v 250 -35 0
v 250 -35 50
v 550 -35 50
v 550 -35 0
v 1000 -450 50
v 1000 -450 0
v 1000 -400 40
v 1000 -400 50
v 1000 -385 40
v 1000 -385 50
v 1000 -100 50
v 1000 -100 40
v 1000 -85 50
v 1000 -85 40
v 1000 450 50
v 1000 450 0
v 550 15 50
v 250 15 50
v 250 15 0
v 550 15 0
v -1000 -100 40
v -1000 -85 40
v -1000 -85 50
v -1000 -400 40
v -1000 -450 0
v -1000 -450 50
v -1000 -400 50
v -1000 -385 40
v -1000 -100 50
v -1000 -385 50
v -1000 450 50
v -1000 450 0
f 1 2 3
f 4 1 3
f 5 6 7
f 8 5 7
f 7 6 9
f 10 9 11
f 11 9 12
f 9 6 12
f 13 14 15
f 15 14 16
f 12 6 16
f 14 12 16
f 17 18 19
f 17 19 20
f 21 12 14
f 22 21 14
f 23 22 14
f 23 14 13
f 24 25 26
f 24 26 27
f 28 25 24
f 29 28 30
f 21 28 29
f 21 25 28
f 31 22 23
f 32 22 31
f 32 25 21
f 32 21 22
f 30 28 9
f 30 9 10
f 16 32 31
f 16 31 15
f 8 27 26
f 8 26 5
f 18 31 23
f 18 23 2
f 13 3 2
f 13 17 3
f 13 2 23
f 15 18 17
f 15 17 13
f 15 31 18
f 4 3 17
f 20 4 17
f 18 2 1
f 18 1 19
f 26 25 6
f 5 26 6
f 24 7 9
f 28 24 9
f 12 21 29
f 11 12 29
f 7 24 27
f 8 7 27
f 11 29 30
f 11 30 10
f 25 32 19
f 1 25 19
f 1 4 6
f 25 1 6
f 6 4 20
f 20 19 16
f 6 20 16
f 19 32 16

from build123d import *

# Parameters (mm, degrees)
F0_W     = 2000
F0_H     = 900
F1_DEPTH = 50
F3_W     = 15
F3_H     = 10
F4_DEPTH = 2000
F5_W     = 15
F5_H     = 10
F6_DEPTH = 2000
F7_W     = 300
F7_H     = 50
F8_DEPTH = 50


with BuildPart() as f1:
    # F0 (on Top) → F1 (new body)
    with BuildSketch(Plane.XY):
        Rectangle(F0_W, F0_H)
    extrude(amount=F1_DEPTH)

    # F3 (on face) → F4 (cut)
    with BuildSketch(Plane.YZ.offset(1000)):
        with Locations((-92.5, 45)):
            Rectangle(F3_W, F3_H)
    extrude(amount=-F4_DEPTH, mode=Mode.SUBTRACT)

    # F5 (on face) → F6 (cut)
    with BuildSketch(Plane.YZ.offset(1000)):
        with Locations((-392.5, 45)):
            Rectangle(F5_W, F5_H)
    extrude(amount=-F6_DEPTH, mode=Mode.SUBTRACT)

    # F7 (on face) → F8 (cut)
    with BuildSketch(Plane.XY.offset(50)):
        with Locations((400, -10)):
            Rectangle(F7_W, F7_H)
    extrude(amount=-F8_DEPTH, mode=Mode.SUBTRACT)


solid = f1.part
